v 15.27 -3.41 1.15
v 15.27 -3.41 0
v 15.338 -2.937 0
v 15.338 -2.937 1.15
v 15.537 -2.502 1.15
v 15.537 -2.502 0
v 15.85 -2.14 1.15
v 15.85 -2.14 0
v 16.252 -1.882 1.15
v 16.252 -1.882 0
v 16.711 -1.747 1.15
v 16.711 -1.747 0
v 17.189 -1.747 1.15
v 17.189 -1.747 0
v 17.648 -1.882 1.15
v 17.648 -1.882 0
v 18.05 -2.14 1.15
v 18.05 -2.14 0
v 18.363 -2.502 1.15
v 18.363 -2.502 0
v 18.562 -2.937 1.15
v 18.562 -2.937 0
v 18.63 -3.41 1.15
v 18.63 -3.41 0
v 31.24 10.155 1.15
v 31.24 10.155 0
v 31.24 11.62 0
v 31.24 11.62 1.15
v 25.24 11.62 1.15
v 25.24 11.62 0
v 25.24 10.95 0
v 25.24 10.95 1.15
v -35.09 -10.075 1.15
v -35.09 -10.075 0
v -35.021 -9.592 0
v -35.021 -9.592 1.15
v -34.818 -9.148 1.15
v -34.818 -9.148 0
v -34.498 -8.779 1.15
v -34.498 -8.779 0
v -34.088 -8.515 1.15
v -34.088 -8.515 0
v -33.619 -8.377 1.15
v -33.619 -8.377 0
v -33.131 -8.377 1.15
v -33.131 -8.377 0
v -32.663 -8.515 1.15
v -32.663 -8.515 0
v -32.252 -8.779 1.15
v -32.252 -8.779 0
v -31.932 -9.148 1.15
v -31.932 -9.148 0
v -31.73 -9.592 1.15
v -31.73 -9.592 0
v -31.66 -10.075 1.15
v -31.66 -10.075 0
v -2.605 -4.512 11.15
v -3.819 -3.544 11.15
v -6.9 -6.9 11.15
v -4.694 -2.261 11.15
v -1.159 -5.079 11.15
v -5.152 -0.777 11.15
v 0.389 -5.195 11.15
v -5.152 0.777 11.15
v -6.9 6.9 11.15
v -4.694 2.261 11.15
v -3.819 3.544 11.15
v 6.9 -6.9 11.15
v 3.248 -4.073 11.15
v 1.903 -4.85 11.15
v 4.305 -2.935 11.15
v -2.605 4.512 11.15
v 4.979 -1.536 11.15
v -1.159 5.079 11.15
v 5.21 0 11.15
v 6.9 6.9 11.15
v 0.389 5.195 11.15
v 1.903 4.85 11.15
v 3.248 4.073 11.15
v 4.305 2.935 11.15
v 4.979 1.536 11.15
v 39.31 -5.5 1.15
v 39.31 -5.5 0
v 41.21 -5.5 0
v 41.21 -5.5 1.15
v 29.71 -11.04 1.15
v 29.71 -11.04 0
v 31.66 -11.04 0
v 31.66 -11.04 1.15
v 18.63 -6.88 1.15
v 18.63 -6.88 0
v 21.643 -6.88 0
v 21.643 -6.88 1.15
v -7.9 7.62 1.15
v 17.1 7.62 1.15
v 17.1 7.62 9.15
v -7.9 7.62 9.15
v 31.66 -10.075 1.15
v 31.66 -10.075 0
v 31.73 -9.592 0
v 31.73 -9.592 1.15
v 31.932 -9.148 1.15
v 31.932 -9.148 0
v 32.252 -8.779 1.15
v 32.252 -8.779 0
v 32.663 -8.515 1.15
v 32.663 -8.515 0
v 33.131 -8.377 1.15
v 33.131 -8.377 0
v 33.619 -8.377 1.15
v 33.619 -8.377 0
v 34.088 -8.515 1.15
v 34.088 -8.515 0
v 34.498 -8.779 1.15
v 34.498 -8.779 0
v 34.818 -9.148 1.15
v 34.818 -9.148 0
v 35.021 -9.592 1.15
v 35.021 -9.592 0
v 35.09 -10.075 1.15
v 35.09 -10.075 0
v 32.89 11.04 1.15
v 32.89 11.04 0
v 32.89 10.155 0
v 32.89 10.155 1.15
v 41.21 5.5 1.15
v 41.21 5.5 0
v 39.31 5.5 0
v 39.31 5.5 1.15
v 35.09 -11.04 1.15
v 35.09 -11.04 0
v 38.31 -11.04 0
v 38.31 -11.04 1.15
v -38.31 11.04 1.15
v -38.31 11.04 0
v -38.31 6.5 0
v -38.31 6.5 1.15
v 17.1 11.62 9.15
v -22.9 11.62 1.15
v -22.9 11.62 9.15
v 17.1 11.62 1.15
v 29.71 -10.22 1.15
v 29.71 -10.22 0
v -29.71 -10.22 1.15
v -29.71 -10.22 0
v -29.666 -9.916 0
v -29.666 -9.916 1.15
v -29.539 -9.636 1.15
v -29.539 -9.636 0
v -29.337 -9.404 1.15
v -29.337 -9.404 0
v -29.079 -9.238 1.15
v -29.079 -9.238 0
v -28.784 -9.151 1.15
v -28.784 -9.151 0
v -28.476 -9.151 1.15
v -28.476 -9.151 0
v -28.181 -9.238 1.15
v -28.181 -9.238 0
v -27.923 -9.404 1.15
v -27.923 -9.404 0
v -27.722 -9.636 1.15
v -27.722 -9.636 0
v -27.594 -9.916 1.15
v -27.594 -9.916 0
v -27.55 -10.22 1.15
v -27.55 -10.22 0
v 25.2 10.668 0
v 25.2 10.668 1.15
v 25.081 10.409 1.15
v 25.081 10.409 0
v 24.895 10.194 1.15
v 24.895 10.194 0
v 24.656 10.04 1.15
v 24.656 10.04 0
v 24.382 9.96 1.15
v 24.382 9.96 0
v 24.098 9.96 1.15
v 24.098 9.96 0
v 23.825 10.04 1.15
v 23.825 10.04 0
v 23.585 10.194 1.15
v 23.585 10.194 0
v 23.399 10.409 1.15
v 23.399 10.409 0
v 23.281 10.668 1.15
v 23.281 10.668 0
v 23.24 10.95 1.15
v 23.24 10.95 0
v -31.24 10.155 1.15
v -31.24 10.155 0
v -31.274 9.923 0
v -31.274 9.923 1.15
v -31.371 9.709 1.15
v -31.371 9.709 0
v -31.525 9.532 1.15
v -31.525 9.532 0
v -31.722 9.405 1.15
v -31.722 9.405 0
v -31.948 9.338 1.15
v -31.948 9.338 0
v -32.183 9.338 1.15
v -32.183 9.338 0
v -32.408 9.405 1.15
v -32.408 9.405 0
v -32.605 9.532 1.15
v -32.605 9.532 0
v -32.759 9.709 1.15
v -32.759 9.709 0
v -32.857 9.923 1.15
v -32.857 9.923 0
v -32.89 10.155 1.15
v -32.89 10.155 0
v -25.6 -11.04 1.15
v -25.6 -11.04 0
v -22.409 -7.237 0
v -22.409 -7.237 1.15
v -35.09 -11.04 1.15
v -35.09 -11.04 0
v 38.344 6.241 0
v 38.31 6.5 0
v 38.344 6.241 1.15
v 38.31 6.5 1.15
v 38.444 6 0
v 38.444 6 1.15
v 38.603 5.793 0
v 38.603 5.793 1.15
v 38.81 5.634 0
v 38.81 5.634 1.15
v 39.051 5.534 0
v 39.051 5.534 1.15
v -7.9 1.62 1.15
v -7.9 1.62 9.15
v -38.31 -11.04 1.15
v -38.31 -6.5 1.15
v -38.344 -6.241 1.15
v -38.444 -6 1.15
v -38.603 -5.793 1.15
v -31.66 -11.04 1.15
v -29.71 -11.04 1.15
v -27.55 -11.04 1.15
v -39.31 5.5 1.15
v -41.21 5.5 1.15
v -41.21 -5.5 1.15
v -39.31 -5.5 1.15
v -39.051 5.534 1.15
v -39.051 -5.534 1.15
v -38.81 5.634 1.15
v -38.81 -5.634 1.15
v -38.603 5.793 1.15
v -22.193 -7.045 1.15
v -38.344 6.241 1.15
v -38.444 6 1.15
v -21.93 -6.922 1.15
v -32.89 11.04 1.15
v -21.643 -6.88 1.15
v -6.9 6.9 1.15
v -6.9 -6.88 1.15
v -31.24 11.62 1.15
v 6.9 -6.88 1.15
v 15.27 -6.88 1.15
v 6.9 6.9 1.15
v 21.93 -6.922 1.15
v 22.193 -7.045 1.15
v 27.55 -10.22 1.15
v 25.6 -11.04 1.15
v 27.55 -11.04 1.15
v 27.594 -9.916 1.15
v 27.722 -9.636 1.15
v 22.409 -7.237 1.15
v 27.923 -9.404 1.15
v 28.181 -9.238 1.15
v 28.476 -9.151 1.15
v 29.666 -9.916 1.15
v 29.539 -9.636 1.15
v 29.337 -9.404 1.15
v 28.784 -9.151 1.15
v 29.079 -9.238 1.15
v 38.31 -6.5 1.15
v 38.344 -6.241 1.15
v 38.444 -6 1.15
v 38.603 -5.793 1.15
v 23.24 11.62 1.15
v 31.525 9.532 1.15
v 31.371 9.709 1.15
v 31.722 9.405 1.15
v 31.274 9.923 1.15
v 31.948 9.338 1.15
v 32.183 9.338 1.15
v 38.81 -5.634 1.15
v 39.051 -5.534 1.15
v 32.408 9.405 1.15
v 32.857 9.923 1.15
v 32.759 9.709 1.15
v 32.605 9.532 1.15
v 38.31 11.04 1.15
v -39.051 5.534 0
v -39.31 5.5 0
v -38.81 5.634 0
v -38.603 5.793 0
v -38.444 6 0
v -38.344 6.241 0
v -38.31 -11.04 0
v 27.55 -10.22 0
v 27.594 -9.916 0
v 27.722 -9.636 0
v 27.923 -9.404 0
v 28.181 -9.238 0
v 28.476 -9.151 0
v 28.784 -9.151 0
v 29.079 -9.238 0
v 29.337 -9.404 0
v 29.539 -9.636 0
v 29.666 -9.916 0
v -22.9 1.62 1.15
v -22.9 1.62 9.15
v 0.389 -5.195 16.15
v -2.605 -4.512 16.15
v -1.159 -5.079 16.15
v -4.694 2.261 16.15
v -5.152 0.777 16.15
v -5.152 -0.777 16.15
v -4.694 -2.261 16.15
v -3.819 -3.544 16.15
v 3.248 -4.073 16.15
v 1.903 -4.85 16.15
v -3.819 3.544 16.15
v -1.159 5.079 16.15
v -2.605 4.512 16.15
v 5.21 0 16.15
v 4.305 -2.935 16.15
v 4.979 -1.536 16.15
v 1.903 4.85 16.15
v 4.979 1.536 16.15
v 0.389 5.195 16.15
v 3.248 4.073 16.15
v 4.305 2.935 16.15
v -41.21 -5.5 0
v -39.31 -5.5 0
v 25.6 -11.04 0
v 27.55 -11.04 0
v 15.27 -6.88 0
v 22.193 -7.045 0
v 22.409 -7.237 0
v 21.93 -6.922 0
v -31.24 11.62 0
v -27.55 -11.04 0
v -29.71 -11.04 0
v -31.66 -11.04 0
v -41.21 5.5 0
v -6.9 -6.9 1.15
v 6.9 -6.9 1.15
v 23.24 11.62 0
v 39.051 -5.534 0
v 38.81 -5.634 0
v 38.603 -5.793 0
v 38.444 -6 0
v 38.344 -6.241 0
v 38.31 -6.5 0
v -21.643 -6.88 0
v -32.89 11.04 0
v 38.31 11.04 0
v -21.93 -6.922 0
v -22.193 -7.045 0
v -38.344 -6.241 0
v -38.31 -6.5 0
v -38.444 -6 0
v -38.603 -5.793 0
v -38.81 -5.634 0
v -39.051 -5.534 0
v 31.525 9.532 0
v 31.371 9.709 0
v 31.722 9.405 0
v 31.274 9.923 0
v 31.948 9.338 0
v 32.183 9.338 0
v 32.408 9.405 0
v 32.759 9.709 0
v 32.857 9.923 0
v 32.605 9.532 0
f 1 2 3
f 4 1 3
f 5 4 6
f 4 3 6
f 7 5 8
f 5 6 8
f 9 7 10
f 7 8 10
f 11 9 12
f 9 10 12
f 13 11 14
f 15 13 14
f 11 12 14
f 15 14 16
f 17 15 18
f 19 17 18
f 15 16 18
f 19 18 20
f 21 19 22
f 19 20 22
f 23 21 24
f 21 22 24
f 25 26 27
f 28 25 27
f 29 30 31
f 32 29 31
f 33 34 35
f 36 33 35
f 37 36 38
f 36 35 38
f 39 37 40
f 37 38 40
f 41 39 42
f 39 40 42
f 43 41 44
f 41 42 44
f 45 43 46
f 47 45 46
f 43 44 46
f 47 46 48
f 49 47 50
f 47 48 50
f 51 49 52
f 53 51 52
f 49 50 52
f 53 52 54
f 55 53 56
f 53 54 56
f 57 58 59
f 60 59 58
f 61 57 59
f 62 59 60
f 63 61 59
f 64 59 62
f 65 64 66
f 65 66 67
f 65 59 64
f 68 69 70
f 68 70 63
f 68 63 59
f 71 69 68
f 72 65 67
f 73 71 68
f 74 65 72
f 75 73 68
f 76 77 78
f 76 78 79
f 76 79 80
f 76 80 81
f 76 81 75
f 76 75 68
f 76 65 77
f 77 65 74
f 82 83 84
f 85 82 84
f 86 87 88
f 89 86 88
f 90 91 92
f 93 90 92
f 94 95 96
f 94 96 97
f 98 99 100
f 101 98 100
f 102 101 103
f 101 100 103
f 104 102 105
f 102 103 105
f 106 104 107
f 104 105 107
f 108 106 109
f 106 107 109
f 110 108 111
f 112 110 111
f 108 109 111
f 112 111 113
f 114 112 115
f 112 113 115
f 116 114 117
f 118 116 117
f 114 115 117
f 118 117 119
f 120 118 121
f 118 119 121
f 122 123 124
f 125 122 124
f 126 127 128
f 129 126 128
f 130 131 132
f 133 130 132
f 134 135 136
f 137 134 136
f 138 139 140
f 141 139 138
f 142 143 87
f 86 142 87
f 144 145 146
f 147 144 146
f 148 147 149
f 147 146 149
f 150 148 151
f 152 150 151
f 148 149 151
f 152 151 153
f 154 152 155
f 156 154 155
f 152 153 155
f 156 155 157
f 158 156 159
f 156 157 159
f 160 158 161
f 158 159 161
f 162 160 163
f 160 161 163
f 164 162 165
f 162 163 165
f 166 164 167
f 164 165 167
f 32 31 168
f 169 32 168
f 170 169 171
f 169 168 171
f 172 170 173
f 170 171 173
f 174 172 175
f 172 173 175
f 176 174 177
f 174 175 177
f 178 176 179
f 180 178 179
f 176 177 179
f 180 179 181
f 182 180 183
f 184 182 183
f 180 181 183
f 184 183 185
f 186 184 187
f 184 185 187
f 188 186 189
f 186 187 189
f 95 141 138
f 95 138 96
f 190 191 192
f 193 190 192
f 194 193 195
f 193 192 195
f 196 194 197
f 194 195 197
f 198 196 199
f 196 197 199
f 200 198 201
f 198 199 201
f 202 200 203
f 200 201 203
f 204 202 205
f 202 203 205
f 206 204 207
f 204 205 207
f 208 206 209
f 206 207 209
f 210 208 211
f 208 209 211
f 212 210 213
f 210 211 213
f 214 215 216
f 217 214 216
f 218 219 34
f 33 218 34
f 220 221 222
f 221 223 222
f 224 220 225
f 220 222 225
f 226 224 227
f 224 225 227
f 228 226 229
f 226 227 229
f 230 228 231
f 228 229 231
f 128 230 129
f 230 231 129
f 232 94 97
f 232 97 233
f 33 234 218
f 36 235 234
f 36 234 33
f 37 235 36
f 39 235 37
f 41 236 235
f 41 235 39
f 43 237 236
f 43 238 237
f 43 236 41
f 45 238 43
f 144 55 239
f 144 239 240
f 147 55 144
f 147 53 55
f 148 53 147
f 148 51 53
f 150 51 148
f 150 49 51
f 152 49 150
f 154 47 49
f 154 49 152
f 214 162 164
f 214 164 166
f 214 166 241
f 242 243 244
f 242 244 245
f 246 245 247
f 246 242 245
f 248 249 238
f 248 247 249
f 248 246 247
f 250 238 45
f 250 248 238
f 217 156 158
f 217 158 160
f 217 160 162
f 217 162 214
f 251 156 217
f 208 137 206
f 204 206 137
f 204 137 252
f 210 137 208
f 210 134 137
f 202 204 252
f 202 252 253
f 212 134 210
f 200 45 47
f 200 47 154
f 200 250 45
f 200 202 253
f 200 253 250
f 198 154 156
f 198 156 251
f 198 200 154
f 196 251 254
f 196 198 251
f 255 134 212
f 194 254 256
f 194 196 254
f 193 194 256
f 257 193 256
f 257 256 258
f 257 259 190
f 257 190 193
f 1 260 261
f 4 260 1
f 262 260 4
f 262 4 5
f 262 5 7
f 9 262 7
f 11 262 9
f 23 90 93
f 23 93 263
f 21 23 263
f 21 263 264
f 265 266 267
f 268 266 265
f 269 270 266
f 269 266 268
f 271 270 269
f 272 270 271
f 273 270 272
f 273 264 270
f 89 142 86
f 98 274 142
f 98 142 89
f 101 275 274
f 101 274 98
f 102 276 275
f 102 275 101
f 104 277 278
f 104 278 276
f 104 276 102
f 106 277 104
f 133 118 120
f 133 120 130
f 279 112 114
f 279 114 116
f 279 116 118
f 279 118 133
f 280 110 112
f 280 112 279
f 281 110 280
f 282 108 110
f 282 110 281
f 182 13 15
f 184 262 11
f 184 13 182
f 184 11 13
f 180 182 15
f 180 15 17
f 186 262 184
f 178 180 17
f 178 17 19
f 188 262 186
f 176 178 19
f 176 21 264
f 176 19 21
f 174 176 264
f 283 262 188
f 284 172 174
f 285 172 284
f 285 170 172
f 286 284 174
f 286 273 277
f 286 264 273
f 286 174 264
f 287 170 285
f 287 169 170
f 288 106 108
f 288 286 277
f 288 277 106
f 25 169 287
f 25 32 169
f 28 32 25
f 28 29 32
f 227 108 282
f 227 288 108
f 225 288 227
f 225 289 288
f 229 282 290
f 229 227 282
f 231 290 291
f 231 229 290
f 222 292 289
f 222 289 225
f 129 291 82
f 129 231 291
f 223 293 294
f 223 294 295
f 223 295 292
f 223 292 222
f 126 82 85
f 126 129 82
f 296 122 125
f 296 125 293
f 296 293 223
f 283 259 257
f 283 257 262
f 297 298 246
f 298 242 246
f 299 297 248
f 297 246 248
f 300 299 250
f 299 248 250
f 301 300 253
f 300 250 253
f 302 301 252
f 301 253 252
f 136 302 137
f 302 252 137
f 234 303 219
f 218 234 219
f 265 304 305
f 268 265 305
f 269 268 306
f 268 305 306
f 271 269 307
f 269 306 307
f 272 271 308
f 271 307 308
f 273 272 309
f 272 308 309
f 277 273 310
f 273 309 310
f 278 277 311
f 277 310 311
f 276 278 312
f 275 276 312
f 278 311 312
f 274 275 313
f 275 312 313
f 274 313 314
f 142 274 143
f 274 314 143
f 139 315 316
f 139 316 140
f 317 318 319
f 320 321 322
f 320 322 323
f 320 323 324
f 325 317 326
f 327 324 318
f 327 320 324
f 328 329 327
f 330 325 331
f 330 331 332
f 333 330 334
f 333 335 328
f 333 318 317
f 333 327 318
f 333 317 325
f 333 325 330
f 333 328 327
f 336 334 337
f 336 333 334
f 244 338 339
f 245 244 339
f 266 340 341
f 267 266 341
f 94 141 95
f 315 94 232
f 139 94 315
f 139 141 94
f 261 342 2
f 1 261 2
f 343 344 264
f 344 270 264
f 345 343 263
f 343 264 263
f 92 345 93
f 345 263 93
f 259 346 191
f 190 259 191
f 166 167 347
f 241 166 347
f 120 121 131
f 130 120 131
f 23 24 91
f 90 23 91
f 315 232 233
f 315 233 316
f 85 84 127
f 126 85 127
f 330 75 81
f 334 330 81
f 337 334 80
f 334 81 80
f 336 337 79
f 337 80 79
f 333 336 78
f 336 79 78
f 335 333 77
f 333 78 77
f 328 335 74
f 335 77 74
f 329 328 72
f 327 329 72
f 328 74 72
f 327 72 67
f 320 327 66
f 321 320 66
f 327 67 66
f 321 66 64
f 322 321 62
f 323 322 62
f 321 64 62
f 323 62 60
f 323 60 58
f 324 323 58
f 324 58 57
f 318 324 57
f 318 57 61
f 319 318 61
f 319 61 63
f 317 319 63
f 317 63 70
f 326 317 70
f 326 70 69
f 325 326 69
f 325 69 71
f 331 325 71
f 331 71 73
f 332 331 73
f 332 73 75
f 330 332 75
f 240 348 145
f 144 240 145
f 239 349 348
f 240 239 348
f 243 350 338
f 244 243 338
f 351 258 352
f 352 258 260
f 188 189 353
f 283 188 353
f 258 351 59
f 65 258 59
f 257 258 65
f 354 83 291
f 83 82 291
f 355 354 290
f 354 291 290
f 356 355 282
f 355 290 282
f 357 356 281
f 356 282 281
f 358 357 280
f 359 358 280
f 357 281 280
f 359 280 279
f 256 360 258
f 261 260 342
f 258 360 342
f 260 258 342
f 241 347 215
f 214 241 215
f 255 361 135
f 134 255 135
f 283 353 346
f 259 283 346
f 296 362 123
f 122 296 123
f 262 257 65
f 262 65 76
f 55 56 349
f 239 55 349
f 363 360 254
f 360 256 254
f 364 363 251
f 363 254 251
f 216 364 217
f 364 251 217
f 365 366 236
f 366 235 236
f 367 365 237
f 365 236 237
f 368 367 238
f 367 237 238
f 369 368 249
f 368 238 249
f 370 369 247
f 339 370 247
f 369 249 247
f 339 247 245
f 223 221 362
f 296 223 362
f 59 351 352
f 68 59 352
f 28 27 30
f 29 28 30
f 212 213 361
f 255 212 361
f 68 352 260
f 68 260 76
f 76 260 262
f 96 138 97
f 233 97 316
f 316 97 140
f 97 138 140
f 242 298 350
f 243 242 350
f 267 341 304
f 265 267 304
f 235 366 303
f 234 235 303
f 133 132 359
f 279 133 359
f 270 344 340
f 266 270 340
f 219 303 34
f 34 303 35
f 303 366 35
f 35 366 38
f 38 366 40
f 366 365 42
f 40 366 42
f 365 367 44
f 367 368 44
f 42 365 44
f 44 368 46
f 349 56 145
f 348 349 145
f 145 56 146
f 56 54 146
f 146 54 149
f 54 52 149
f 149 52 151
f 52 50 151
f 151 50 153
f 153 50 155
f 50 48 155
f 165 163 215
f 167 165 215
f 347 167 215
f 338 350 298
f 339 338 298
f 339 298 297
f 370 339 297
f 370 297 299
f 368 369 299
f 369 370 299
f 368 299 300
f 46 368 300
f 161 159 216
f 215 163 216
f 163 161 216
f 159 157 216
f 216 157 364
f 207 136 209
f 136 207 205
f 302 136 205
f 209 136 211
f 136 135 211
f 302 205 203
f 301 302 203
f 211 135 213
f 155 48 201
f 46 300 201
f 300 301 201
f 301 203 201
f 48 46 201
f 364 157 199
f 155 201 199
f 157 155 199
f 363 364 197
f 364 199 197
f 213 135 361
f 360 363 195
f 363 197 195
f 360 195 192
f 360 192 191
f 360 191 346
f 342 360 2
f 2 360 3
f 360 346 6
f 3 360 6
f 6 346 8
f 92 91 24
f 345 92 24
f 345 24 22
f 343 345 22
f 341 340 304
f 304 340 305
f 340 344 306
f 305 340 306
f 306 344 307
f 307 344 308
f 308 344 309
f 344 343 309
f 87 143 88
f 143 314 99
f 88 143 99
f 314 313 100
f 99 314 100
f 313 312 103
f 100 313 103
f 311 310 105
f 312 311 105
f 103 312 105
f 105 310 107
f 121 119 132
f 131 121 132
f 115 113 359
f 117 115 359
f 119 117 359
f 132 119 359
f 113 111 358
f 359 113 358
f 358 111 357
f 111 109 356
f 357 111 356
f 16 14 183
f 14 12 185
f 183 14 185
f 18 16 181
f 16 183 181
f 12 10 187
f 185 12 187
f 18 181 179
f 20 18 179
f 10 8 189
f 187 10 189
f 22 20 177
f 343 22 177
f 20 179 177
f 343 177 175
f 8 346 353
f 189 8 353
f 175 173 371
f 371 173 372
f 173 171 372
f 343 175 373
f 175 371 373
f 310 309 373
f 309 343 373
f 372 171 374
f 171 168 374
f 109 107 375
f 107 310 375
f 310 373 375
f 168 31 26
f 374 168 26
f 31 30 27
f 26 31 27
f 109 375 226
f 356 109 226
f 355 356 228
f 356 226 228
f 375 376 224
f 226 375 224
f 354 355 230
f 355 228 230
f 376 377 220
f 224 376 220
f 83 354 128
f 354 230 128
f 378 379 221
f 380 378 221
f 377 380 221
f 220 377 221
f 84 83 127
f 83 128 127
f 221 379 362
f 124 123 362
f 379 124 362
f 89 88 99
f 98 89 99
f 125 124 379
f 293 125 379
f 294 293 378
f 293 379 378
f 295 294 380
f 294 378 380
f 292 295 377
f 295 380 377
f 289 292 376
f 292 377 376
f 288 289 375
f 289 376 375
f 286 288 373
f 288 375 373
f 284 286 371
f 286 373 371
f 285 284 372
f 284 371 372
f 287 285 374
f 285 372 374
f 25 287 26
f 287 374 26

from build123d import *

# Parameters (mm, degrees)
BOSS_EXTRUDE1_DEPTH = 1.15
SKETCH2_R           = 5.21
BOSS_EXTRUDE2_DEPTH = 15
SKETCH3_W           = 13.8
SKETCH3_H           = 13.8
BOSS_EXTRUDE3_DEPTH = 10
FILLET1_R           = 1
BOSS_EXTRUDE4_DEPTH = 8


with BuildPart() as part:
    # Sketch1 → Boss-Extrude1 (new body)
    with BuildSketch(Plane.XY):
        with BuildLine():
            Line((38.310144928, -11.04), (38.310144928, -5.5))
            Line((38.310144928, -5.5), (41.210144928, -5.5))
            Line((41.210144928, -5.5), (41.210144928, 5.5))
            Line((41.210144928, 5.5), (38.310144928, 5.5))
            Line((38.310144928, 5.5), (38.310144928, 11.04))
            Line((38.310144928, 11.04), (32.890144928, 11.04))
            Line((32.890144928, 11.04), (32.890144928, 10.155))
            ThreePointArc((32.890144928, 10.155), (32.065144928, 9.33), (31.240144928, 10.155))
            Line((31.240144928, 10.155), (31.240144928, 11.62))
            Line((31.240144928, 11.62), (25.240144928, 11.62))
            Line((25.240144928, 11.62), (25.240144928, 10.95))
            ThreePointArc((25.240144928, 10.95), (24.240144928, 9.95), (23.240144928, 10.95))
            Line((23.240144928, 10.95), (23.240144928, 11.62))
            Line((23.240144928, 11.62), (-31.240144928, 11.62))
            Line((-31.240144928, 11.62), (-31.240144928, 10.155))
            ThreePointArc((-31.240144928, 10.155), (-32.065144928, 9.33), (-32.890144928, 10.155))
            Line((-32.890144928, 10.155), (-32.890144928, 11.04))
            Line((-32.890144928, 11.04), (-38.310144928, 11.04))
            Line((-38.310144928, 11.04), (-38.310144928, 5.5))
            Line((-38.310144928, 5.5), (-41.210144928, 5.5))
            Line((-41.210144928, 5.5), (-41.210144928, -5.5))
            Line((-41.210144928, -5.5), (-38.310144928, -5.5))
            Line((-38.310144928, -5.5), (-38.310144928, -11.04))
            Line((-38.310144928, -11.04), (-35.090144928, -11.04))
            Line((-35.090144928, -11.04), (-35.090144928, -10.074999983))
            ThreePointArc((-35.090144928, -10.074999983), (-33.375144928, -8.36), (-31.660144928, -10.074999983))
            Line((-31.660144928, -10.074999983), (-31.660144928, -11.04))
            Line((-31.660144928, -11.04), (-29.710144928, -11.04))
            Line((-29.710144928, -11.04), (-29.710144928, -10.22))
            ThreePointArc((-29.710144928, -10.22), (-28.630144928, -9.14), (-27.550144928, -10.22))
            Line((-27.550144928, -10.22), (-27.550144928, -11.04))
            Line((-27.550144928, -11.04), (-25.600144928, -11.04))
            Line((-25.600144928, -11.04), (-22.109490462, -6.88))
            Line((-22.109490462, -6.88), (15.270144928, -6.88))
            Line((15.270144928, -6.88), (15.270144928, -3.41))
            ThreePointArc((15.270144928, -3.41), (16.950144928, -1.73), (18.630144928, -3.41))
            Line((18.630144928, -3.41), (18.630144928, -6.88))
            Line((18.630144928, -6.88), (22.109490462, -6.88))
            Line((22.109490462, -6.88), (25.600144928, -11.04))
            Line((25.600144928, -11.04), (27.550144928, -11.04))
            Line((27.550144928, -11.04), (27.550144928, -10.219999678))
            ThreePointArc((27.550144928, -10.219999678), (28.630144928, -9.14), (29.710144928, -10.219999678))
            Line((29.710144928, -10.219999678), (29.710144928, -11.04))
            Line((29.710144928, -11.04), (31.660144928, -11.04))
            Line((31.660144928, -11.04), (31.660144928, -10.075))
            ThreePointArc((31.660144928, -10.075), (33.375144928, -8.36), (35.090144928, -10.075))
            Line((35.090144928, -10.075), (35.090144928, -11.04))
            Line((35.090144928, -11.04), (38.310144928, -11.04))
        make_face()
    extrude(amount=BOSS_EXTRUDE1_DEPTH)

    # Sketch2 → Boss-Extrude2 (add)
    with BuildSketch(Plane.XY.offset(1.15)):
        Circle(SKETCH2_R)
    extrude(amount=BOSS_EXTRUDE2_DEPTH)

    # Sketch3 → Boss-Extrude3 (add)
    with BuildSketch(Plane.XY.offset(1.15)):
        Rectangle(SKETCH3_W, SKETCH3_H)
    extrude(amount=BOSS_EXTRUDE3_DEPTH)

    # Fillet1
    fillet1_edges = [part.edges().sort_by_distance(p)[0] for p in [
        (22.109490462, -6.88, 0.575),
        (-22.109490462, -6.88, 0.575),
        (-38.310144928, -5.5, 0.575),
        (-38.310144928, 5.5, 0.575),
        (38.310144928, 5.5, 0.575),
        (38.310144928, -5.5, 0.575),
    ]]
    fillet(fillet1_edges, radius=FILLET1_R)


with BuildPart() as body_2:
    # Sketch4 → Boss-Extrude4 (new body)
    with BuildSketch(Plane.XY.offset(1.15)):
        Polygon((-7.9, 7.62), (-7.9, 1.62), (-22.9, 1.62), (-22.9, 11.62), (17.1, 11.62), (17.1, 7.62), align=None)
    extrude(amount=BOSS_EXTRUDE4_DEPTH)


solid = Compound([part.part, body_2.part])
